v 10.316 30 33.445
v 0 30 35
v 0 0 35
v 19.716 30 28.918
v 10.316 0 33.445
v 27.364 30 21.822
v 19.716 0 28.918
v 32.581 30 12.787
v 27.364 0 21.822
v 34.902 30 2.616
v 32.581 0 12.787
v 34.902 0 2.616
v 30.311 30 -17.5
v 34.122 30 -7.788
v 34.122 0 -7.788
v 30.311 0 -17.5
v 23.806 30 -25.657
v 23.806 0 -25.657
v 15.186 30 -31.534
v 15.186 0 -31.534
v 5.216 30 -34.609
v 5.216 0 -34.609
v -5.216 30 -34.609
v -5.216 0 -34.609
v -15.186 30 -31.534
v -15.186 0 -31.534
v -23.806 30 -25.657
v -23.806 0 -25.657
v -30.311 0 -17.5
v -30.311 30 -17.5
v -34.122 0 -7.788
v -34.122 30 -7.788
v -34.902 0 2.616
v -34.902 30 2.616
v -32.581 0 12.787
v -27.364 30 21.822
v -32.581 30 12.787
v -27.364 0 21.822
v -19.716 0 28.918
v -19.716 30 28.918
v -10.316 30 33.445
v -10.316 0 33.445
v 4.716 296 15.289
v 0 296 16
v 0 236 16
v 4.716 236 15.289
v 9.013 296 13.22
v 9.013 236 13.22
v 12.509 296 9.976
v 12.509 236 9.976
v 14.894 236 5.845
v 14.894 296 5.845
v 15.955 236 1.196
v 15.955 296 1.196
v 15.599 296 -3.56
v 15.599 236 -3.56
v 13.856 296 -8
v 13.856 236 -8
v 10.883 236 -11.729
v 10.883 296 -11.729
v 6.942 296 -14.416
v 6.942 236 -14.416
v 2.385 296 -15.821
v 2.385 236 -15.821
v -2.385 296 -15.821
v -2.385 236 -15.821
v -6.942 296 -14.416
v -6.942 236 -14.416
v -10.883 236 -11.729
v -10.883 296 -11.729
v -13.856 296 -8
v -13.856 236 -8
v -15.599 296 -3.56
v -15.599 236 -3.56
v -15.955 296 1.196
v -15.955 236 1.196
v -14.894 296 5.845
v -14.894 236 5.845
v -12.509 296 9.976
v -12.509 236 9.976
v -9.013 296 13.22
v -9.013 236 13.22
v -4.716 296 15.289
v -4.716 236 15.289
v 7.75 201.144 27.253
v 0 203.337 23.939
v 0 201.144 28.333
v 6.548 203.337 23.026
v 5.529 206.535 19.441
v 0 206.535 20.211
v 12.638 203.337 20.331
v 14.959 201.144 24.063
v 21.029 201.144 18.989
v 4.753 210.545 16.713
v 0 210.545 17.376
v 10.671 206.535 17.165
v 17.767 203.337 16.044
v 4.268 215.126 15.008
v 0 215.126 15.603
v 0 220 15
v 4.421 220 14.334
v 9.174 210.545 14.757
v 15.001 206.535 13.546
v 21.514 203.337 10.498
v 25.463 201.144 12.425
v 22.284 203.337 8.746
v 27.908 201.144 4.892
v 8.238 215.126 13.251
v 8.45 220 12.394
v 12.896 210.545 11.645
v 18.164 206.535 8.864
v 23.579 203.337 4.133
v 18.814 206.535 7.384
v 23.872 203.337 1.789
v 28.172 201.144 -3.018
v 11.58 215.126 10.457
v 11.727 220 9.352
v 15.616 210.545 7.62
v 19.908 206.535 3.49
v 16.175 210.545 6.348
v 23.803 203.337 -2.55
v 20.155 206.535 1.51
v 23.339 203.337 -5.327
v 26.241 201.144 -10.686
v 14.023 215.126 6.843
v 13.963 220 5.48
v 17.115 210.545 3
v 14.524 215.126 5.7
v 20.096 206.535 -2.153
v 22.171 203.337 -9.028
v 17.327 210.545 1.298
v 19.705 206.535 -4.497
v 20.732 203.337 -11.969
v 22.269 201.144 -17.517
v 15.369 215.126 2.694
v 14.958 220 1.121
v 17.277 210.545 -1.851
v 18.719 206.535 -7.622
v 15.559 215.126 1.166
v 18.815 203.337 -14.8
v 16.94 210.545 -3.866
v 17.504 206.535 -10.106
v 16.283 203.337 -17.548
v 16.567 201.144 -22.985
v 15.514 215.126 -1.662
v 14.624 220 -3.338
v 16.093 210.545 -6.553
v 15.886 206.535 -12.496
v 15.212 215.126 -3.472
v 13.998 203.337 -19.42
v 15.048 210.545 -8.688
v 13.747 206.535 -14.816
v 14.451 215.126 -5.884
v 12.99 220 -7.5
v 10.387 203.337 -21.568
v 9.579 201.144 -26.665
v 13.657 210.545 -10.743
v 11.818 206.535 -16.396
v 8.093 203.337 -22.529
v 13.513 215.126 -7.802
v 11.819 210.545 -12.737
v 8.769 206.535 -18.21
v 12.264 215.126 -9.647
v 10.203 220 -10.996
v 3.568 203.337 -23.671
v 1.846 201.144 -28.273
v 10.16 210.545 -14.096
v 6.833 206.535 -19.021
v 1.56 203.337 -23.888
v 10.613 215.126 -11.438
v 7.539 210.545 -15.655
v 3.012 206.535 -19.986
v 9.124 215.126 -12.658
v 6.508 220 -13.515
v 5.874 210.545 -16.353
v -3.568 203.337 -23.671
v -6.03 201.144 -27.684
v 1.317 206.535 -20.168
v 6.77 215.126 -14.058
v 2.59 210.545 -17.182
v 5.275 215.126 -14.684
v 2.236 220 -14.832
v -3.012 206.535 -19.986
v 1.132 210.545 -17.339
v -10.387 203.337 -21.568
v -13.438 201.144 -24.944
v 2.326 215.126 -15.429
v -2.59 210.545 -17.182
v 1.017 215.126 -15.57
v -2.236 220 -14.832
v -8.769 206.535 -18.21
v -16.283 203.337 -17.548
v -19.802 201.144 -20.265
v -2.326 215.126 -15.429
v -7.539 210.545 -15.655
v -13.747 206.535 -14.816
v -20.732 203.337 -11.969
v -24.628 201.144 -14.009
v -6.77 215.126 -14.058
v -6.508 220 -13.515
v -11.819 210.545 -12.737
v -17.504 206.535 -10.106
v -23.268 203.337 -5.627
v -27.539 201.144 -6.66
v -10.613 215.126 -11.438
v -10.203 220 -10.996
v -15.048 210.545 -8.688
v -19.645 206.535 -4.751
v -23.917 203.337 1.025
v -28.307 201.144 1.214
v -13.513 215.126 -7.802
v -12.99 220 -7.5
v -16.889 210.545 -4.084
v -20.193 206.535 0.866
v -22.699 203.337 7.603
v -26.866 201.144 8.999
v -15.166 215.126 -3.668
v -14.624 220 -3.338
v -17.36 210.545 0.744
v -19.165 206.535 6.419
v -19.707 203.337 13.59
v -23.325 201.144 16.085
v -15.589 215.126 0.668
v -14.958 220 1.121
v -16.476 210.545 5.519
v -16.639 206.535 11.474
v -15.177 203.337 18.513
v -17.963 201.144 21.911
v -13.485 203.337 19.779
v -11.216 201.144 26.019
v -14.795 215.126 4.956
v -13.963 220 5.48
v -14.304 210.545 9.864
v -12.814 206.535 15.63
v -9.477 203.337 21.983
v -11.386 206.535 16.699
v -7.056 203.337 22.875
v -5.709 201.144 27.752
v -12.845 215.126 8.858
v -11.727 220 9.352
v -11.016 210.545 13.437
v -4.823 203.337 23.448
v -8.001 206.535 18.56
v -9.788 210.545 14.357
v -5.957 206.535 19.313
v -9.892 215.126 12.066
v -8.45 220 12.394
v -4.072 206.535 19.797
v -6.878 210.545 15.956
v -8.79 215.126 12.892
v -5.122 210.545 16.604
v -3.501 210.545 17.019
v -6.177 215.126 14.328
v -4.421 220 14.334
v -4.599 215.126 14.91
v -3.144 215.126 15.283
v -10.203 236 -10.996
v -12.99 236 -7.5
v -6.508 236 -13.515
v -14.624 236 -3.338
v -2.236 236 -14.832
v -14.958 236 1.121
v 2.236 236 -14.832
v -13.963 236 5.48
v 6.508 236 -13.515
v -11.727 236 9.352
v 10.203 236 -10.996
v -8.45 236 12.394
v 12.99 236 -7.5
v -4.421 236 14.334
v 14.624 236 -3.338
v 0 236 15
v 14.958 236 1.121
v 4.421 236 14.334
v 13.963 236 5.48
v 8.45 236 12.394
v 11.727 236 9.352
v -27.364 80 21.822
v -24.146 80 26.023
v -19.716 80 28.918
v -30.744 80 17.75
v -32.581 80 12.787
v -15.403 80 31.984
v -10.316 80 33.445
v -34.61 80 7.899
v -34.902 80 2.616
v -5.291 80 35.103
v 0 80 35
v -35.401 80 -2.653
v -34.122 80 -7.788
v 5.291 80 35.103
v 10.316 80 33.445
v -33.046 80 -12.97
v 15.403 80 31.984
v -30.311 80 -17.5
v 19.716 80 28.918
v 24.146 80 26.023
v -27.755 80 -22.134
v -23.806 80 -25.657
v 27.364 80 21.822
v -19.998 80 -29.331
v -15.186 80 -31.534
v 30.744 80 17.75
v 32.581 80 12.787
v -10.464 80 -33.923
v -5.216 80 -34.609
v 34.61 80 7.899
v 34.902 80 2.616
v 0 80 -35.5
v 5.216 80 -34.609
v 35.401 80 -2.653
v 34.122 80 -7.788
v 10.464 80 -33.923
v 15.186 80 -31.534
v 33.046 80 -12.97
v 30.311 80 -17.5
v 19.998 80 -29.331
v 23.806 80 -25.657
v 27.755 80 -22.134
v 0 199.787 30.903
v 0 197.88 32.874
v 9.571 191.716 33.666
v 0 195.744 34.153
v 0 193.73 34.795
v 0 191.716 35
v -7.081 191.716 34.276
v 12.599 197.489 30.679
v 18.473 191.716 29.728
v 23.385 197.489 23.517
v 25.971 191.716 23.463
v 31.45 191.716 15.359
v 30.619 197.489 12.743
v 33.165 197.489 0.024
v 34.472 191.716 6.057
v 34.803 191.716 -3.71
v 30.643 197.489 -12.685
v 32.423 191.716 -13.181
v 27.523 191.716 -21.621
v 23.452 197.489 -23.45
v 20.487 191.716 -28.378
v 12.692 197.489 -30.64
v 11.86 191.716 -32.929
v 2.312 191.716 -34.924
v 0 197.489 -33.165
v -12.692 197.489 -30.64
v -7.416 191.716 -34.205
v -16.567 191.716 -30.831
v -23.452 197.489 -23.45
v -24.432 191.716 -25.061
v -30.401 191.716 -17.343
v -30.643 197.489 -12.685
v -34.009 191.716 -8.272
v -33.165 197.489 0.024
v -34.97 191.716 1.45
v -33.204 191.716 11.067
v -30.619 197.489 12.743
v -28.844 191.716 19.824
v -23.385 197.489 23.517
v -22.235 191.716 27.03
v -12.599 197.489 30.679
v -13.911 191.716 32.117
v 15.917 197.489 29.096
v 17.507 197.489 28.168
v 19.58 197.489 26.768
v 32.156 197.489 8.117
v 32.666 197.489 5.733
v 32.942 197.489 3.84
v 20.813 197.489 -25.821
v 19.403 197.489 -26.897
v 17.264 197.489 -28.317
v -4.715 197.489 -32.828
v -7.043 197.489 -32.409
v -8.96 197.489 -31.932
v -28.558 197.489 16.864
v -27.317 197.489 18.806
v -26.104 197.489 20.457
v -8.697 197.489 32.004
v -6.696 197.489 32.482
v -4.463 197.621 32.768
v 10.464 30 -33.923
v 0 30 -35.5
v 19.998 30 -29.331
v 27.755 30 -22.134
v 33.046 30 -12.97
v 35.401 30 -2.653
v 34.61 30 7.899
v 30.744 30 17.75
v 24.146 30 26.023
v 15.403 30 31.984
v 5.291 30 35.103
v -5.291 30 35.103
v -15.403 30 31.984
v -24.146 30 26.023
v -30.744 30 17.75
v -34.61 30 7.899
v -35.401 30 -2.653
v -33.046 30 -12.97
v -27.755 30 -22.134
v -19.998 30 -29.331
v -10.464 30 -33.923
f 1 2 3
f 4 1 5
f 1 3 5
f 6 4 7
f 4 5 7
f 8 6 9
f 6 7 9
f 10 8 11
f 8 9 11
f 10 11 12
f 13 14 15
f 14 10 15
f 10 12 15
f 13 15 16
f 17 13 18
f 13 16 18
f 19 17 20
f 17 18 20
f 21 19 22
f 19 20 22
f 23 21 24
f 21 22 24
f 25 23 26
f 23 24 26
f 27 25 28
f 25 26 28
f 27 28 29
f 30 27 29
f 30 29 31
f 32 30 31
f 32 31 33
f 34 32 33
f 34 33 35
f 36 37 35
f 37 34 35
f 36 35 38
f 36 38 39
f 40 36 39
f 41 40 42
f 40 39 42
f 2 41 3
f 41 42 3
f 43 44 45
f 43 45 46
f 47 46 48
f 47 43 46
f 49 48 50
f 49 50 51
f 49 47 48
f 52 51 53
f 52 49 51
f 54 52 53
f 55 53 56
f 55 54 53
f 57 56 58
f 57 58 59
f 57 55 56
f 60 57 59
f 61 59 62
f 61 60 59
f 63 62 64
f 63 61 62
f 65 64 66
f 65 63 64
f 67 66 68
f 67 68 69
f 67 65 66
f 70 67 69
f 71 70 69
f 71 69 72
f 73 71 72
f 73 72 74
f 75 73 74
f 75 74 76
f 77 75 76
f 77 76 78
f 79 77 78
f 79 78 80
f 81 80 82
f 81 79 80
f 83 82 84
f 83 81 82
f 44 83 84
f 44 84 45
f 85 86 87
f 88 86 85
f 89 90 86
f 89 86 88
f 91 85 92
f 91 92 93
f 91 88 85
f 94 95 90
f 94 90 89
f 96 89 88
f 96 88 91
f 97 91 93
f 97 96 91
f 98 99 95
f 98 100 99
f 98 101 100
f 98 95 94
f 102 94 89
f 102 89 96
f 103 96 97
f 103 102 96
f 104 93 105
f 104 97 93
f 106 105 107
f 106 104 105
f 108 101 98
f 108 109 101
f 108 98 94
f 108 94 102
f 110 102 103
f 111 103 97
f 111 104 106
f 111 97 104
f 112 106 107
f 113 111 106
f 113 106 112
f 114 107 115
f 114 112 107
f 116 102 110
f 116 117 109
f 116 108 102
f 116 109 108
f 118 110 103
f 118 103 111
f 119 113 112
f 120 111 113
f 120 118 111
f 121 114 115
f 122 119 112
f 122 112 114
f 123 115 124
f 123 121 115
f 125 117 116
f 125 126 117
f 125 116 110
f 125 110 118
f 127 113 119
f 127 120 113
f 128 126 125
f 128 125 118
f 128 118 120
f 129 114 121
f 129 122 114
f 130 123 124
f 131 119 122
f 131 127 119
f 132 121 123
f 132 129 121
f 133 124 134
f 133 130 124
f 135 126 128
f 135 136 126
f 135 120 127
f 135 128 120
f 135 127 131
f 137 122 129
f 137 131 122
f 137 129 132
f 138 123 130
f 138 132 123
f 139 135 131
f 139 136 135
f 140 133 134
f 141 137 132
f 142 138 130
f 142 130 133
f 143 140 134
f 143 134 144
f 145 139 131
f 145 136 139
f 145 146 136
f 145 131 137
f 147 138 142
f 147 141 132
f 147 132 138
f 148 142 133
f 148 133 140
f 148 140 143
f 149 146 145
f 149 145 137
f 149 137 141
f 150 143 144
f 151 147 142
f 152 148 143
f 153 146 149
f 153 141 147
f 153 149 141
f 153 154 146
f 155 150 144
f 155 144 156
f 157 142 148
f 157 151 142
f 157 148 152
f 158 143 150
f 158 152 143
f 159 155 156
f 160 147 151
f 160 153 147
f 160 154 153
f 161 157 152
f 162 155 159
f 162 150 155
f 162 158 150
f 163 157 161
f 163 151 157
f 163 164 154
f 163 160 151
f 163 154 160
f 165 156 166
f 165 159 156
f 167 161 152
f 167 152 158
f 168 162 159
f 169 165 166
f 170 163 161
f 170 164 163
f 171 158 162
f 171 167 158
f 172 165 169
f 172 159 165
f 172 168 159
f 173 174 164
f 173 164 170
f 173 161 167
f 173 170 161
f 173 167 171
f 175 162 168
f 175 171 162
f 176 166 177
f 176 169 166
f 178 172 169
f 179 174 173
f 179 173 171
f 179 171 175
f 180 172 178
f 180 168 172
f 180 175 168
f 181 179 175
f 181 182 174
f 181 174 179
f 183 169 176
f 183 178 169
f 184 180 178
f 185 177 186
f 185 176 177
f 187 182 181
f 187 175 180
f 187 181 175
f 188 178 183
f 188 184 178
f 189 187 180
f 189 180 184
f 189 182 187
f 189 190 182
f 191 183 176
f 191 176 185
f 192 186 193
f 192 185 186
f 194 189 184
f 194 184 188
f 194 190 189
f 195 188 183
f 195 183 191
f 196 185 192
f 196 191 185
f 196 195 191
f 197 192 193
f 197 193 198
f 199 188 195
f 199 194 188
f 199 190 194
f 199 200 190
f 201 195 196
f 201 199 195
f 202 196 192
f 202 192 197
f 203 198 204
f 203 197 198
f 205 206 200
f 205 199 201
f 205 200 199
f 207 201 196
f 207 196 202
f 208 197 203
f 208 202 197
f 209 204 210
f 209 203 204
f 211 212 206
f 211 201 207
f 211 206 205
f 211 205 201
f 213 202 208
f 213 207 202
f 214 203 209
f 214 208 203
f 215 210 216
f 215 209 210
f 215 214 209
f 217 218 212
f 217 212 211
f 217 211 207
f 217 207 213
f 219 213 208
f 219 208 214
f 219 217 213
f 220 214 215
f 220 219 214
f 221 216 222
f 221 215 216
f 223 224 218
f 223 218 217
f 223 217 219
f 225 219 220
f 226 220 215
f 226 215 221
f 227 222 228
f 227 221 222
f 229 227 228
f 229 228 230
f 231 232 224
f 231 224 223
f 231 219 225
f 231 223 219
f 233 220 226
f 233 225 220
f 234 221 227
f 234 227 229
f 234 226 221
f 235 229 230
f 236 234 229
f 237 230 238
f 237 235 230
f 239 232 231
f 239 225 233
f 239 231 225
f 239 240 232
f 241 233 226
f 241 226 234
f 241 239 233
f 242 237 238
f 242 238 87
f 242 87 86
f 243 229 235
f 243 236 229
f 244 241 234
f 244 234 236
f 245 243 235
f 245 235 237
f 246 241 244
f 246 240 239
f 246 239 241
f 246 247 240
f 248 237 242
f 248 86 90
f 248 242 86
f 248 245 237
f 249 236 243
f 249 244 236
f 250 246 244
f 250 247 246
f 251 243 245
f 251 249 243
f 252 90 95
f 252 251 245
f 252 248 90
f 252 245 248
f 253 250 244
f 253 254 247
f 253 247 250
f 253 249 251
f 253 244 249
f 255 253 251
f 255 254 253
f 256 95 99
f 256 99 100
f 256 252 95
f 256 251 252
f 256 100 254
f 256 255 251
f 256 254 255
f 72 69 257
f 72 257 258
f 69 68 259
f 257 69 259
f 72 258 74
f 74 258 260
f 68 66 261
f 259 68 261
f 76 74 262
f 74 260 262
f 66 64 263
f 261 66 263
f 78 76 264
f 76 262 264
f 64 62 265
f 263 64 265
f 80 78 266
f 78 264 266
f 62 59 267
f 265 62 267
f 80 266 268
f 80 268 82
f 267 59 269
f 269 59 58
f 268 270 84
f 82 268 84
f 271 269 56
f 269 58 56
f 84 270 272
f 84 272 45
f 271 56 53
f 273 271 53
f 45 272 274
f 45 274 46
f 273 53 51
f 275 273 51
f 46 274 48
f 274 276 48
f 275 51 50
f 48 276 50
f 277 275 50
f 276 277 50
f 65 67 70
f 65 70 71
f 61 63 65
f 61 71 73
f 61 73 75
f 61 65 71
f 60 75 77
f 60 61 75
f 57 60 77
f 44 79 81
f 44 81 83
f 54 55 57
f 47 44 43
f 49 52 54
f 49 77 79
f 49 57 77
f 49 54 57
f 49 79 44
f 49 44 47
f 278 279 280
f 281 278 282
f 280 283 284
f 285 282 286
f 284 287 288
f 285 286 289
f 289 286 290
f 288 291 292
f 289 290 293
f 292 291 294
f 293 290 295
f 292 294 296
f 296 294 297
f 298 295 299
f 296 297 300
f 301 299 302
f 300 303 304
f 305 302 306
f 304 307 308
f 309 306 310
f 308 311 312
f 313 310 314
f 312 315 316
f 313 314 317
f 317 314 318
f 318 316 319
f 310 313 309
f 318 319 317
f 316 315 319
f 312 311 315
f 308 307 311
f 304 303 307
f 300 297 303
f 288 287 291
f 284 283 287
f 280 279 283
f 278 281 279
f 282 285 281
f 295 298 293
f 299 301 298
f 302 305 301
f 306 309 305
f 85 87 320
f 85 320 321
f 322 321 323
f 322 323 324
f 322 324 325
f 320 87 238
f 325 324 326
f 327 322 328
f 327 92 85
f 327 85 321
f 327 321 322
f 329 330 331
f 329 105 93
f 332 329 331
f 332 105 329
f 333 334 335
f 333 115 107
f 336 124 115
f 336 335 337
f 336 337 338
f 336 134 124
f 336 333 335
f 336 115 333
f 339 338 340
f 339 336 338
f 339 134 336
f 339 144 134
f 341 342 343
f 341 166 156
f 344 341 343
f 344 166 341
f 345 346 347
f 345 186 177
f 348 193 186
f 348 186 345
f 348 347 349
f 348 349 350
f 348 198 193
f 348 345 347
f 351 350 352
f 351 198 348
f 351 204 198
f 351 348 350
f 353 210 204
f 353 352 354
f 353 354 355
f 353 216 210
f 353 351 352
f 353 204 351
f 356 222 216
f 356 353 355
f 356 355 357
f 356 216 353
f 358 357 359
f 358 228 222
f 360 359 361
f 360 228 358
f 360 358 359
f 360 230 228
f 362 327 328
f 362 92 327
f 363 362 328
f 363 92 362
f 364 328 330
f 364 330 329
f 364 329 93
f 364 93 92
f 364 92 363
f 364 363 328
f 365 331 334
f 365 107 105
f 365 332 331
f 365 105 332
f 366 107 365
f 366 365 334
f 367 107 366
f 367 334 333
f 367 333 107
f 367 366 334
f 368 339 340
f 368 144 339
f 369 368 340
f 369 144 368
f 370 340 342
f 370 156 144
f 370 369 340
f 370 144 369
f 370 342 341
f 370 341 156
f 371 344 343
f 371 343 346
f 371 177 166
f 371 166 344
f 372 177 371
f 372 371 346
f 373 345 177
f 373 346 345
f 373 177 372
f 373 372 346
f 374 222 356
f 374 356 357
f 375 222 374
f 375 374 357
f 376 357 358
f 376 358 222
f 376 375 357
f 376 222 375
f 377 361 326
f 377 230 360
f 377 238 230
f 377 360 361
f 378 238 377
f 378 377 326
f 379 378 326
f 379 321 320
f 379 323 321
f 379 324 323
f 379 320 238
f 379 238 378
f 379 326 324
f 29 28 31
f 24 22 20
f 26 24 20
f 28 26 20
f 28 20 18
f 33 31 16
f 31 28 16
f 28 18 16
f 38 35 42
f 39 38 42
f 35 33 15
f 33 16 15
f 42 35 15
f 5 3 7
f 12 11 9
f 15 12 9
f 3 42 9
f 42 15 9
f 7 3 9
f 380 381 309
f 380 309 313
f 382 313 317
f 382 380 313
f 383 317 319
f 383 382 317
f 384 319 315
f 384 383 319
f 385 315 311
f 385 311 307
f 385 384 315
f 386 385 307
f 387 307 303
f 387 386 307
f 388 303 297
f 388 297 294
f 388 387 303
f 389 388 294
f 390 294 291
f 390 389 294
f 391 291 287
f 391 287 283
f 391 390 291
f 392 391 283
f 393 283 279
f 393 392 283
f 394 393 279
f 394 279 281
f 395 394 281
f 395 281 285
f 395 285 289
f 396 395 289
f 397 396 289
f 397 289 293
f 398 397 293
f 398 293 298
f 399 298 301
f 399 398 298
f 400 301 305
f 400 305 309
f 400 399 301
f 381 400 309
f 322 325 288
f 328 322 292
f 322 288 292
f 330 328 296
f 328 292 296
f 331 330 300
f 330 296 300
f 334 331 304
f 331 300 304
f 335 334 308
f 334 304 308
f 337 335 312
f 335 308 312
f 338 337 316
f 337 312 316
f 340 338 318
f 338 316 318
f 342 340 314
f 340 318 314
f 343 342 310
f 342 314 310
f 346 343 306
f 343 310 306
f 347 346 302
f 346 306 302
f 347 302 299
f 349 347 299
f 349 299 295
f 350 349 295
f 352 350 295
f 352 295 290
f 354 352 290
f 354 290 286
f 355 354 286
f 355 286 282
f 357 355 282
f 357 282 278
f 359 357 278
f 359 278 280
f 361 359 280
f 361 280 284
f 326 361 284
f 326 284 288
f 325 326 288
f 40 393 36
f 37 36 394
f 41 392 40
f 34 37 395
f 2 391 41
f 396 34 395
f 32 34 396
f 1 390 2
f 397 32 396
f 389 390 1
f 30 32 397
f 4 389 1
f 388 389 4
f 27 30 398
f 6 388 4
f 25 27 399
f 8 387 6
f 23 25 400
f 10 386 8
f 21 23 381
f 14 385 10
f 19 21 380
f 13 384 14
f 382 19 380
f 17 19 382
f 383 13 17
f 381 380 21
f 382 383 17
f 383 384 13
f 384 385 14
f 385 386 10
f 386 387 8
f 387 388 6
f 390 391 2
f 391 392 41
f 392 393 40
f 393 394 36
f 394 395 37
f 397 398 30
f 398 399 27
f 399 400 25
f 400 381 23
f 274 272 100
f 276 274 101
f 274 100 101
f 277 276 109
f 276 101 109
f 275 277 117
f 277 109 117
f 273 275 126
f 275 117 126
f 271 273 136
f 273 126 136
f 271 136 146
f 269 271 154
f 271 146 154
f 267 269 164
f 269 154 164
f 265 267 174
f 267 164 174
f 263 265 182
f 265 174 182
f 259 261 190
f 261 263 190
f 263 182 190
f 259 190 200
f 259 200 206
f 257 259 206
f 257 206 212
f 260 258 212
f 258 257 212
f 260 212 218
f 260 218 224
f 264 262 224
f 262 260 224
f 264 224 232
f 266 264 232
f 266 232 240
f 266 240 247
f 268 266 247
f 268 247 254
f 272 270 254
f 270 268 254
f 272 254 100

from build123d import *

# Parameters (mm, degrees)
SKETCH2_R           = 35
BOSS_EXTRUDE1_DEPTH = 200
SKETCH3_R           = 15
BOSS_EXTRUDE2_DEPTH = 95
FILLET1_R           = 20
FILLET2_R           = 10
BOSS_EXTRUDE3_START = 1
SKETCH4_R           = 16
BOSS_EXTRUDE3_DEPTH = 60
BOSS_EXTRUDE4_START = -30
SKETCH5_R           = 35.5
BOSS_EXTRUDE4_DEPTH = 50


with BuildPart() as part:
    # Sketch2 → Boss-Extrude1 (new body)
    with BuildSketch(Plane(origin=(0, 0, 0), x_dir=(1, 0, 0), z_dir=(0, 1, 0))):
        with Locations(Location((0, 0, 0), (0, 0, 270))):
            Circle(SKETCH2_R)
    extrude(amount=BOSS_EXTRUDE1_DEPTH)

    # Sketch3 → Boss-Extrude2 (add)
    with BuildSketch(Plane(origin=(0, 200, 0), x_dir=(1, 0, 0), z_dir=(0, 1, 0))):
        with Locations(Location((0, 0, 0), (0, 0, 270))):
            Circle(SKETCH3_R)
    extrude(amount=BOSS_EXTRUDE2_DEPTH)

    # Fillet1
    fillet1_edges = [part.edges().sort_by_distance(p)[0] for p in [
        (0, 200, -15),
    ]]
    fillet(fillet1_edges, radius=FILLET1_R - 0.0001)  # a hair under: the kernel refuses the full size

    # Fillet2
    fillet2_edges = [part.edges().sort_by_distance(p)[0] for p in [
        (0, 200, -35),
    ]]
    fillet(fillet2_edges, radius=FILLET2_R)

    # Sketch4 → Boss-Extrude3 (add)
    with BuildSketch(Plane(origin=(0, 295, 0), x_dir=(1, 0, 0), z_dir=(0, 1, 0)).offset(BOSS_EXTRUDE3_START)):
        with Locations(Location((0, 0, 0), (0, 0, 270))):
            Circle(SKETCH4_R)
    extrude(amount=-BOSS_EXTRUDE3_DEPTH)

    # Sketch5 → Boss-Extrude4 (add)
    with BuildSketch(Plane.XZ.offset(BOSS_EXTRUDE4_START)):
        with Locations(Location((0, 0, 0), (0, 0, 270))):
            Circle(SKETCH5_R)
    extrude(amount=-BOSS_EXTRUDE4_DEPTH)


solid = part.part
